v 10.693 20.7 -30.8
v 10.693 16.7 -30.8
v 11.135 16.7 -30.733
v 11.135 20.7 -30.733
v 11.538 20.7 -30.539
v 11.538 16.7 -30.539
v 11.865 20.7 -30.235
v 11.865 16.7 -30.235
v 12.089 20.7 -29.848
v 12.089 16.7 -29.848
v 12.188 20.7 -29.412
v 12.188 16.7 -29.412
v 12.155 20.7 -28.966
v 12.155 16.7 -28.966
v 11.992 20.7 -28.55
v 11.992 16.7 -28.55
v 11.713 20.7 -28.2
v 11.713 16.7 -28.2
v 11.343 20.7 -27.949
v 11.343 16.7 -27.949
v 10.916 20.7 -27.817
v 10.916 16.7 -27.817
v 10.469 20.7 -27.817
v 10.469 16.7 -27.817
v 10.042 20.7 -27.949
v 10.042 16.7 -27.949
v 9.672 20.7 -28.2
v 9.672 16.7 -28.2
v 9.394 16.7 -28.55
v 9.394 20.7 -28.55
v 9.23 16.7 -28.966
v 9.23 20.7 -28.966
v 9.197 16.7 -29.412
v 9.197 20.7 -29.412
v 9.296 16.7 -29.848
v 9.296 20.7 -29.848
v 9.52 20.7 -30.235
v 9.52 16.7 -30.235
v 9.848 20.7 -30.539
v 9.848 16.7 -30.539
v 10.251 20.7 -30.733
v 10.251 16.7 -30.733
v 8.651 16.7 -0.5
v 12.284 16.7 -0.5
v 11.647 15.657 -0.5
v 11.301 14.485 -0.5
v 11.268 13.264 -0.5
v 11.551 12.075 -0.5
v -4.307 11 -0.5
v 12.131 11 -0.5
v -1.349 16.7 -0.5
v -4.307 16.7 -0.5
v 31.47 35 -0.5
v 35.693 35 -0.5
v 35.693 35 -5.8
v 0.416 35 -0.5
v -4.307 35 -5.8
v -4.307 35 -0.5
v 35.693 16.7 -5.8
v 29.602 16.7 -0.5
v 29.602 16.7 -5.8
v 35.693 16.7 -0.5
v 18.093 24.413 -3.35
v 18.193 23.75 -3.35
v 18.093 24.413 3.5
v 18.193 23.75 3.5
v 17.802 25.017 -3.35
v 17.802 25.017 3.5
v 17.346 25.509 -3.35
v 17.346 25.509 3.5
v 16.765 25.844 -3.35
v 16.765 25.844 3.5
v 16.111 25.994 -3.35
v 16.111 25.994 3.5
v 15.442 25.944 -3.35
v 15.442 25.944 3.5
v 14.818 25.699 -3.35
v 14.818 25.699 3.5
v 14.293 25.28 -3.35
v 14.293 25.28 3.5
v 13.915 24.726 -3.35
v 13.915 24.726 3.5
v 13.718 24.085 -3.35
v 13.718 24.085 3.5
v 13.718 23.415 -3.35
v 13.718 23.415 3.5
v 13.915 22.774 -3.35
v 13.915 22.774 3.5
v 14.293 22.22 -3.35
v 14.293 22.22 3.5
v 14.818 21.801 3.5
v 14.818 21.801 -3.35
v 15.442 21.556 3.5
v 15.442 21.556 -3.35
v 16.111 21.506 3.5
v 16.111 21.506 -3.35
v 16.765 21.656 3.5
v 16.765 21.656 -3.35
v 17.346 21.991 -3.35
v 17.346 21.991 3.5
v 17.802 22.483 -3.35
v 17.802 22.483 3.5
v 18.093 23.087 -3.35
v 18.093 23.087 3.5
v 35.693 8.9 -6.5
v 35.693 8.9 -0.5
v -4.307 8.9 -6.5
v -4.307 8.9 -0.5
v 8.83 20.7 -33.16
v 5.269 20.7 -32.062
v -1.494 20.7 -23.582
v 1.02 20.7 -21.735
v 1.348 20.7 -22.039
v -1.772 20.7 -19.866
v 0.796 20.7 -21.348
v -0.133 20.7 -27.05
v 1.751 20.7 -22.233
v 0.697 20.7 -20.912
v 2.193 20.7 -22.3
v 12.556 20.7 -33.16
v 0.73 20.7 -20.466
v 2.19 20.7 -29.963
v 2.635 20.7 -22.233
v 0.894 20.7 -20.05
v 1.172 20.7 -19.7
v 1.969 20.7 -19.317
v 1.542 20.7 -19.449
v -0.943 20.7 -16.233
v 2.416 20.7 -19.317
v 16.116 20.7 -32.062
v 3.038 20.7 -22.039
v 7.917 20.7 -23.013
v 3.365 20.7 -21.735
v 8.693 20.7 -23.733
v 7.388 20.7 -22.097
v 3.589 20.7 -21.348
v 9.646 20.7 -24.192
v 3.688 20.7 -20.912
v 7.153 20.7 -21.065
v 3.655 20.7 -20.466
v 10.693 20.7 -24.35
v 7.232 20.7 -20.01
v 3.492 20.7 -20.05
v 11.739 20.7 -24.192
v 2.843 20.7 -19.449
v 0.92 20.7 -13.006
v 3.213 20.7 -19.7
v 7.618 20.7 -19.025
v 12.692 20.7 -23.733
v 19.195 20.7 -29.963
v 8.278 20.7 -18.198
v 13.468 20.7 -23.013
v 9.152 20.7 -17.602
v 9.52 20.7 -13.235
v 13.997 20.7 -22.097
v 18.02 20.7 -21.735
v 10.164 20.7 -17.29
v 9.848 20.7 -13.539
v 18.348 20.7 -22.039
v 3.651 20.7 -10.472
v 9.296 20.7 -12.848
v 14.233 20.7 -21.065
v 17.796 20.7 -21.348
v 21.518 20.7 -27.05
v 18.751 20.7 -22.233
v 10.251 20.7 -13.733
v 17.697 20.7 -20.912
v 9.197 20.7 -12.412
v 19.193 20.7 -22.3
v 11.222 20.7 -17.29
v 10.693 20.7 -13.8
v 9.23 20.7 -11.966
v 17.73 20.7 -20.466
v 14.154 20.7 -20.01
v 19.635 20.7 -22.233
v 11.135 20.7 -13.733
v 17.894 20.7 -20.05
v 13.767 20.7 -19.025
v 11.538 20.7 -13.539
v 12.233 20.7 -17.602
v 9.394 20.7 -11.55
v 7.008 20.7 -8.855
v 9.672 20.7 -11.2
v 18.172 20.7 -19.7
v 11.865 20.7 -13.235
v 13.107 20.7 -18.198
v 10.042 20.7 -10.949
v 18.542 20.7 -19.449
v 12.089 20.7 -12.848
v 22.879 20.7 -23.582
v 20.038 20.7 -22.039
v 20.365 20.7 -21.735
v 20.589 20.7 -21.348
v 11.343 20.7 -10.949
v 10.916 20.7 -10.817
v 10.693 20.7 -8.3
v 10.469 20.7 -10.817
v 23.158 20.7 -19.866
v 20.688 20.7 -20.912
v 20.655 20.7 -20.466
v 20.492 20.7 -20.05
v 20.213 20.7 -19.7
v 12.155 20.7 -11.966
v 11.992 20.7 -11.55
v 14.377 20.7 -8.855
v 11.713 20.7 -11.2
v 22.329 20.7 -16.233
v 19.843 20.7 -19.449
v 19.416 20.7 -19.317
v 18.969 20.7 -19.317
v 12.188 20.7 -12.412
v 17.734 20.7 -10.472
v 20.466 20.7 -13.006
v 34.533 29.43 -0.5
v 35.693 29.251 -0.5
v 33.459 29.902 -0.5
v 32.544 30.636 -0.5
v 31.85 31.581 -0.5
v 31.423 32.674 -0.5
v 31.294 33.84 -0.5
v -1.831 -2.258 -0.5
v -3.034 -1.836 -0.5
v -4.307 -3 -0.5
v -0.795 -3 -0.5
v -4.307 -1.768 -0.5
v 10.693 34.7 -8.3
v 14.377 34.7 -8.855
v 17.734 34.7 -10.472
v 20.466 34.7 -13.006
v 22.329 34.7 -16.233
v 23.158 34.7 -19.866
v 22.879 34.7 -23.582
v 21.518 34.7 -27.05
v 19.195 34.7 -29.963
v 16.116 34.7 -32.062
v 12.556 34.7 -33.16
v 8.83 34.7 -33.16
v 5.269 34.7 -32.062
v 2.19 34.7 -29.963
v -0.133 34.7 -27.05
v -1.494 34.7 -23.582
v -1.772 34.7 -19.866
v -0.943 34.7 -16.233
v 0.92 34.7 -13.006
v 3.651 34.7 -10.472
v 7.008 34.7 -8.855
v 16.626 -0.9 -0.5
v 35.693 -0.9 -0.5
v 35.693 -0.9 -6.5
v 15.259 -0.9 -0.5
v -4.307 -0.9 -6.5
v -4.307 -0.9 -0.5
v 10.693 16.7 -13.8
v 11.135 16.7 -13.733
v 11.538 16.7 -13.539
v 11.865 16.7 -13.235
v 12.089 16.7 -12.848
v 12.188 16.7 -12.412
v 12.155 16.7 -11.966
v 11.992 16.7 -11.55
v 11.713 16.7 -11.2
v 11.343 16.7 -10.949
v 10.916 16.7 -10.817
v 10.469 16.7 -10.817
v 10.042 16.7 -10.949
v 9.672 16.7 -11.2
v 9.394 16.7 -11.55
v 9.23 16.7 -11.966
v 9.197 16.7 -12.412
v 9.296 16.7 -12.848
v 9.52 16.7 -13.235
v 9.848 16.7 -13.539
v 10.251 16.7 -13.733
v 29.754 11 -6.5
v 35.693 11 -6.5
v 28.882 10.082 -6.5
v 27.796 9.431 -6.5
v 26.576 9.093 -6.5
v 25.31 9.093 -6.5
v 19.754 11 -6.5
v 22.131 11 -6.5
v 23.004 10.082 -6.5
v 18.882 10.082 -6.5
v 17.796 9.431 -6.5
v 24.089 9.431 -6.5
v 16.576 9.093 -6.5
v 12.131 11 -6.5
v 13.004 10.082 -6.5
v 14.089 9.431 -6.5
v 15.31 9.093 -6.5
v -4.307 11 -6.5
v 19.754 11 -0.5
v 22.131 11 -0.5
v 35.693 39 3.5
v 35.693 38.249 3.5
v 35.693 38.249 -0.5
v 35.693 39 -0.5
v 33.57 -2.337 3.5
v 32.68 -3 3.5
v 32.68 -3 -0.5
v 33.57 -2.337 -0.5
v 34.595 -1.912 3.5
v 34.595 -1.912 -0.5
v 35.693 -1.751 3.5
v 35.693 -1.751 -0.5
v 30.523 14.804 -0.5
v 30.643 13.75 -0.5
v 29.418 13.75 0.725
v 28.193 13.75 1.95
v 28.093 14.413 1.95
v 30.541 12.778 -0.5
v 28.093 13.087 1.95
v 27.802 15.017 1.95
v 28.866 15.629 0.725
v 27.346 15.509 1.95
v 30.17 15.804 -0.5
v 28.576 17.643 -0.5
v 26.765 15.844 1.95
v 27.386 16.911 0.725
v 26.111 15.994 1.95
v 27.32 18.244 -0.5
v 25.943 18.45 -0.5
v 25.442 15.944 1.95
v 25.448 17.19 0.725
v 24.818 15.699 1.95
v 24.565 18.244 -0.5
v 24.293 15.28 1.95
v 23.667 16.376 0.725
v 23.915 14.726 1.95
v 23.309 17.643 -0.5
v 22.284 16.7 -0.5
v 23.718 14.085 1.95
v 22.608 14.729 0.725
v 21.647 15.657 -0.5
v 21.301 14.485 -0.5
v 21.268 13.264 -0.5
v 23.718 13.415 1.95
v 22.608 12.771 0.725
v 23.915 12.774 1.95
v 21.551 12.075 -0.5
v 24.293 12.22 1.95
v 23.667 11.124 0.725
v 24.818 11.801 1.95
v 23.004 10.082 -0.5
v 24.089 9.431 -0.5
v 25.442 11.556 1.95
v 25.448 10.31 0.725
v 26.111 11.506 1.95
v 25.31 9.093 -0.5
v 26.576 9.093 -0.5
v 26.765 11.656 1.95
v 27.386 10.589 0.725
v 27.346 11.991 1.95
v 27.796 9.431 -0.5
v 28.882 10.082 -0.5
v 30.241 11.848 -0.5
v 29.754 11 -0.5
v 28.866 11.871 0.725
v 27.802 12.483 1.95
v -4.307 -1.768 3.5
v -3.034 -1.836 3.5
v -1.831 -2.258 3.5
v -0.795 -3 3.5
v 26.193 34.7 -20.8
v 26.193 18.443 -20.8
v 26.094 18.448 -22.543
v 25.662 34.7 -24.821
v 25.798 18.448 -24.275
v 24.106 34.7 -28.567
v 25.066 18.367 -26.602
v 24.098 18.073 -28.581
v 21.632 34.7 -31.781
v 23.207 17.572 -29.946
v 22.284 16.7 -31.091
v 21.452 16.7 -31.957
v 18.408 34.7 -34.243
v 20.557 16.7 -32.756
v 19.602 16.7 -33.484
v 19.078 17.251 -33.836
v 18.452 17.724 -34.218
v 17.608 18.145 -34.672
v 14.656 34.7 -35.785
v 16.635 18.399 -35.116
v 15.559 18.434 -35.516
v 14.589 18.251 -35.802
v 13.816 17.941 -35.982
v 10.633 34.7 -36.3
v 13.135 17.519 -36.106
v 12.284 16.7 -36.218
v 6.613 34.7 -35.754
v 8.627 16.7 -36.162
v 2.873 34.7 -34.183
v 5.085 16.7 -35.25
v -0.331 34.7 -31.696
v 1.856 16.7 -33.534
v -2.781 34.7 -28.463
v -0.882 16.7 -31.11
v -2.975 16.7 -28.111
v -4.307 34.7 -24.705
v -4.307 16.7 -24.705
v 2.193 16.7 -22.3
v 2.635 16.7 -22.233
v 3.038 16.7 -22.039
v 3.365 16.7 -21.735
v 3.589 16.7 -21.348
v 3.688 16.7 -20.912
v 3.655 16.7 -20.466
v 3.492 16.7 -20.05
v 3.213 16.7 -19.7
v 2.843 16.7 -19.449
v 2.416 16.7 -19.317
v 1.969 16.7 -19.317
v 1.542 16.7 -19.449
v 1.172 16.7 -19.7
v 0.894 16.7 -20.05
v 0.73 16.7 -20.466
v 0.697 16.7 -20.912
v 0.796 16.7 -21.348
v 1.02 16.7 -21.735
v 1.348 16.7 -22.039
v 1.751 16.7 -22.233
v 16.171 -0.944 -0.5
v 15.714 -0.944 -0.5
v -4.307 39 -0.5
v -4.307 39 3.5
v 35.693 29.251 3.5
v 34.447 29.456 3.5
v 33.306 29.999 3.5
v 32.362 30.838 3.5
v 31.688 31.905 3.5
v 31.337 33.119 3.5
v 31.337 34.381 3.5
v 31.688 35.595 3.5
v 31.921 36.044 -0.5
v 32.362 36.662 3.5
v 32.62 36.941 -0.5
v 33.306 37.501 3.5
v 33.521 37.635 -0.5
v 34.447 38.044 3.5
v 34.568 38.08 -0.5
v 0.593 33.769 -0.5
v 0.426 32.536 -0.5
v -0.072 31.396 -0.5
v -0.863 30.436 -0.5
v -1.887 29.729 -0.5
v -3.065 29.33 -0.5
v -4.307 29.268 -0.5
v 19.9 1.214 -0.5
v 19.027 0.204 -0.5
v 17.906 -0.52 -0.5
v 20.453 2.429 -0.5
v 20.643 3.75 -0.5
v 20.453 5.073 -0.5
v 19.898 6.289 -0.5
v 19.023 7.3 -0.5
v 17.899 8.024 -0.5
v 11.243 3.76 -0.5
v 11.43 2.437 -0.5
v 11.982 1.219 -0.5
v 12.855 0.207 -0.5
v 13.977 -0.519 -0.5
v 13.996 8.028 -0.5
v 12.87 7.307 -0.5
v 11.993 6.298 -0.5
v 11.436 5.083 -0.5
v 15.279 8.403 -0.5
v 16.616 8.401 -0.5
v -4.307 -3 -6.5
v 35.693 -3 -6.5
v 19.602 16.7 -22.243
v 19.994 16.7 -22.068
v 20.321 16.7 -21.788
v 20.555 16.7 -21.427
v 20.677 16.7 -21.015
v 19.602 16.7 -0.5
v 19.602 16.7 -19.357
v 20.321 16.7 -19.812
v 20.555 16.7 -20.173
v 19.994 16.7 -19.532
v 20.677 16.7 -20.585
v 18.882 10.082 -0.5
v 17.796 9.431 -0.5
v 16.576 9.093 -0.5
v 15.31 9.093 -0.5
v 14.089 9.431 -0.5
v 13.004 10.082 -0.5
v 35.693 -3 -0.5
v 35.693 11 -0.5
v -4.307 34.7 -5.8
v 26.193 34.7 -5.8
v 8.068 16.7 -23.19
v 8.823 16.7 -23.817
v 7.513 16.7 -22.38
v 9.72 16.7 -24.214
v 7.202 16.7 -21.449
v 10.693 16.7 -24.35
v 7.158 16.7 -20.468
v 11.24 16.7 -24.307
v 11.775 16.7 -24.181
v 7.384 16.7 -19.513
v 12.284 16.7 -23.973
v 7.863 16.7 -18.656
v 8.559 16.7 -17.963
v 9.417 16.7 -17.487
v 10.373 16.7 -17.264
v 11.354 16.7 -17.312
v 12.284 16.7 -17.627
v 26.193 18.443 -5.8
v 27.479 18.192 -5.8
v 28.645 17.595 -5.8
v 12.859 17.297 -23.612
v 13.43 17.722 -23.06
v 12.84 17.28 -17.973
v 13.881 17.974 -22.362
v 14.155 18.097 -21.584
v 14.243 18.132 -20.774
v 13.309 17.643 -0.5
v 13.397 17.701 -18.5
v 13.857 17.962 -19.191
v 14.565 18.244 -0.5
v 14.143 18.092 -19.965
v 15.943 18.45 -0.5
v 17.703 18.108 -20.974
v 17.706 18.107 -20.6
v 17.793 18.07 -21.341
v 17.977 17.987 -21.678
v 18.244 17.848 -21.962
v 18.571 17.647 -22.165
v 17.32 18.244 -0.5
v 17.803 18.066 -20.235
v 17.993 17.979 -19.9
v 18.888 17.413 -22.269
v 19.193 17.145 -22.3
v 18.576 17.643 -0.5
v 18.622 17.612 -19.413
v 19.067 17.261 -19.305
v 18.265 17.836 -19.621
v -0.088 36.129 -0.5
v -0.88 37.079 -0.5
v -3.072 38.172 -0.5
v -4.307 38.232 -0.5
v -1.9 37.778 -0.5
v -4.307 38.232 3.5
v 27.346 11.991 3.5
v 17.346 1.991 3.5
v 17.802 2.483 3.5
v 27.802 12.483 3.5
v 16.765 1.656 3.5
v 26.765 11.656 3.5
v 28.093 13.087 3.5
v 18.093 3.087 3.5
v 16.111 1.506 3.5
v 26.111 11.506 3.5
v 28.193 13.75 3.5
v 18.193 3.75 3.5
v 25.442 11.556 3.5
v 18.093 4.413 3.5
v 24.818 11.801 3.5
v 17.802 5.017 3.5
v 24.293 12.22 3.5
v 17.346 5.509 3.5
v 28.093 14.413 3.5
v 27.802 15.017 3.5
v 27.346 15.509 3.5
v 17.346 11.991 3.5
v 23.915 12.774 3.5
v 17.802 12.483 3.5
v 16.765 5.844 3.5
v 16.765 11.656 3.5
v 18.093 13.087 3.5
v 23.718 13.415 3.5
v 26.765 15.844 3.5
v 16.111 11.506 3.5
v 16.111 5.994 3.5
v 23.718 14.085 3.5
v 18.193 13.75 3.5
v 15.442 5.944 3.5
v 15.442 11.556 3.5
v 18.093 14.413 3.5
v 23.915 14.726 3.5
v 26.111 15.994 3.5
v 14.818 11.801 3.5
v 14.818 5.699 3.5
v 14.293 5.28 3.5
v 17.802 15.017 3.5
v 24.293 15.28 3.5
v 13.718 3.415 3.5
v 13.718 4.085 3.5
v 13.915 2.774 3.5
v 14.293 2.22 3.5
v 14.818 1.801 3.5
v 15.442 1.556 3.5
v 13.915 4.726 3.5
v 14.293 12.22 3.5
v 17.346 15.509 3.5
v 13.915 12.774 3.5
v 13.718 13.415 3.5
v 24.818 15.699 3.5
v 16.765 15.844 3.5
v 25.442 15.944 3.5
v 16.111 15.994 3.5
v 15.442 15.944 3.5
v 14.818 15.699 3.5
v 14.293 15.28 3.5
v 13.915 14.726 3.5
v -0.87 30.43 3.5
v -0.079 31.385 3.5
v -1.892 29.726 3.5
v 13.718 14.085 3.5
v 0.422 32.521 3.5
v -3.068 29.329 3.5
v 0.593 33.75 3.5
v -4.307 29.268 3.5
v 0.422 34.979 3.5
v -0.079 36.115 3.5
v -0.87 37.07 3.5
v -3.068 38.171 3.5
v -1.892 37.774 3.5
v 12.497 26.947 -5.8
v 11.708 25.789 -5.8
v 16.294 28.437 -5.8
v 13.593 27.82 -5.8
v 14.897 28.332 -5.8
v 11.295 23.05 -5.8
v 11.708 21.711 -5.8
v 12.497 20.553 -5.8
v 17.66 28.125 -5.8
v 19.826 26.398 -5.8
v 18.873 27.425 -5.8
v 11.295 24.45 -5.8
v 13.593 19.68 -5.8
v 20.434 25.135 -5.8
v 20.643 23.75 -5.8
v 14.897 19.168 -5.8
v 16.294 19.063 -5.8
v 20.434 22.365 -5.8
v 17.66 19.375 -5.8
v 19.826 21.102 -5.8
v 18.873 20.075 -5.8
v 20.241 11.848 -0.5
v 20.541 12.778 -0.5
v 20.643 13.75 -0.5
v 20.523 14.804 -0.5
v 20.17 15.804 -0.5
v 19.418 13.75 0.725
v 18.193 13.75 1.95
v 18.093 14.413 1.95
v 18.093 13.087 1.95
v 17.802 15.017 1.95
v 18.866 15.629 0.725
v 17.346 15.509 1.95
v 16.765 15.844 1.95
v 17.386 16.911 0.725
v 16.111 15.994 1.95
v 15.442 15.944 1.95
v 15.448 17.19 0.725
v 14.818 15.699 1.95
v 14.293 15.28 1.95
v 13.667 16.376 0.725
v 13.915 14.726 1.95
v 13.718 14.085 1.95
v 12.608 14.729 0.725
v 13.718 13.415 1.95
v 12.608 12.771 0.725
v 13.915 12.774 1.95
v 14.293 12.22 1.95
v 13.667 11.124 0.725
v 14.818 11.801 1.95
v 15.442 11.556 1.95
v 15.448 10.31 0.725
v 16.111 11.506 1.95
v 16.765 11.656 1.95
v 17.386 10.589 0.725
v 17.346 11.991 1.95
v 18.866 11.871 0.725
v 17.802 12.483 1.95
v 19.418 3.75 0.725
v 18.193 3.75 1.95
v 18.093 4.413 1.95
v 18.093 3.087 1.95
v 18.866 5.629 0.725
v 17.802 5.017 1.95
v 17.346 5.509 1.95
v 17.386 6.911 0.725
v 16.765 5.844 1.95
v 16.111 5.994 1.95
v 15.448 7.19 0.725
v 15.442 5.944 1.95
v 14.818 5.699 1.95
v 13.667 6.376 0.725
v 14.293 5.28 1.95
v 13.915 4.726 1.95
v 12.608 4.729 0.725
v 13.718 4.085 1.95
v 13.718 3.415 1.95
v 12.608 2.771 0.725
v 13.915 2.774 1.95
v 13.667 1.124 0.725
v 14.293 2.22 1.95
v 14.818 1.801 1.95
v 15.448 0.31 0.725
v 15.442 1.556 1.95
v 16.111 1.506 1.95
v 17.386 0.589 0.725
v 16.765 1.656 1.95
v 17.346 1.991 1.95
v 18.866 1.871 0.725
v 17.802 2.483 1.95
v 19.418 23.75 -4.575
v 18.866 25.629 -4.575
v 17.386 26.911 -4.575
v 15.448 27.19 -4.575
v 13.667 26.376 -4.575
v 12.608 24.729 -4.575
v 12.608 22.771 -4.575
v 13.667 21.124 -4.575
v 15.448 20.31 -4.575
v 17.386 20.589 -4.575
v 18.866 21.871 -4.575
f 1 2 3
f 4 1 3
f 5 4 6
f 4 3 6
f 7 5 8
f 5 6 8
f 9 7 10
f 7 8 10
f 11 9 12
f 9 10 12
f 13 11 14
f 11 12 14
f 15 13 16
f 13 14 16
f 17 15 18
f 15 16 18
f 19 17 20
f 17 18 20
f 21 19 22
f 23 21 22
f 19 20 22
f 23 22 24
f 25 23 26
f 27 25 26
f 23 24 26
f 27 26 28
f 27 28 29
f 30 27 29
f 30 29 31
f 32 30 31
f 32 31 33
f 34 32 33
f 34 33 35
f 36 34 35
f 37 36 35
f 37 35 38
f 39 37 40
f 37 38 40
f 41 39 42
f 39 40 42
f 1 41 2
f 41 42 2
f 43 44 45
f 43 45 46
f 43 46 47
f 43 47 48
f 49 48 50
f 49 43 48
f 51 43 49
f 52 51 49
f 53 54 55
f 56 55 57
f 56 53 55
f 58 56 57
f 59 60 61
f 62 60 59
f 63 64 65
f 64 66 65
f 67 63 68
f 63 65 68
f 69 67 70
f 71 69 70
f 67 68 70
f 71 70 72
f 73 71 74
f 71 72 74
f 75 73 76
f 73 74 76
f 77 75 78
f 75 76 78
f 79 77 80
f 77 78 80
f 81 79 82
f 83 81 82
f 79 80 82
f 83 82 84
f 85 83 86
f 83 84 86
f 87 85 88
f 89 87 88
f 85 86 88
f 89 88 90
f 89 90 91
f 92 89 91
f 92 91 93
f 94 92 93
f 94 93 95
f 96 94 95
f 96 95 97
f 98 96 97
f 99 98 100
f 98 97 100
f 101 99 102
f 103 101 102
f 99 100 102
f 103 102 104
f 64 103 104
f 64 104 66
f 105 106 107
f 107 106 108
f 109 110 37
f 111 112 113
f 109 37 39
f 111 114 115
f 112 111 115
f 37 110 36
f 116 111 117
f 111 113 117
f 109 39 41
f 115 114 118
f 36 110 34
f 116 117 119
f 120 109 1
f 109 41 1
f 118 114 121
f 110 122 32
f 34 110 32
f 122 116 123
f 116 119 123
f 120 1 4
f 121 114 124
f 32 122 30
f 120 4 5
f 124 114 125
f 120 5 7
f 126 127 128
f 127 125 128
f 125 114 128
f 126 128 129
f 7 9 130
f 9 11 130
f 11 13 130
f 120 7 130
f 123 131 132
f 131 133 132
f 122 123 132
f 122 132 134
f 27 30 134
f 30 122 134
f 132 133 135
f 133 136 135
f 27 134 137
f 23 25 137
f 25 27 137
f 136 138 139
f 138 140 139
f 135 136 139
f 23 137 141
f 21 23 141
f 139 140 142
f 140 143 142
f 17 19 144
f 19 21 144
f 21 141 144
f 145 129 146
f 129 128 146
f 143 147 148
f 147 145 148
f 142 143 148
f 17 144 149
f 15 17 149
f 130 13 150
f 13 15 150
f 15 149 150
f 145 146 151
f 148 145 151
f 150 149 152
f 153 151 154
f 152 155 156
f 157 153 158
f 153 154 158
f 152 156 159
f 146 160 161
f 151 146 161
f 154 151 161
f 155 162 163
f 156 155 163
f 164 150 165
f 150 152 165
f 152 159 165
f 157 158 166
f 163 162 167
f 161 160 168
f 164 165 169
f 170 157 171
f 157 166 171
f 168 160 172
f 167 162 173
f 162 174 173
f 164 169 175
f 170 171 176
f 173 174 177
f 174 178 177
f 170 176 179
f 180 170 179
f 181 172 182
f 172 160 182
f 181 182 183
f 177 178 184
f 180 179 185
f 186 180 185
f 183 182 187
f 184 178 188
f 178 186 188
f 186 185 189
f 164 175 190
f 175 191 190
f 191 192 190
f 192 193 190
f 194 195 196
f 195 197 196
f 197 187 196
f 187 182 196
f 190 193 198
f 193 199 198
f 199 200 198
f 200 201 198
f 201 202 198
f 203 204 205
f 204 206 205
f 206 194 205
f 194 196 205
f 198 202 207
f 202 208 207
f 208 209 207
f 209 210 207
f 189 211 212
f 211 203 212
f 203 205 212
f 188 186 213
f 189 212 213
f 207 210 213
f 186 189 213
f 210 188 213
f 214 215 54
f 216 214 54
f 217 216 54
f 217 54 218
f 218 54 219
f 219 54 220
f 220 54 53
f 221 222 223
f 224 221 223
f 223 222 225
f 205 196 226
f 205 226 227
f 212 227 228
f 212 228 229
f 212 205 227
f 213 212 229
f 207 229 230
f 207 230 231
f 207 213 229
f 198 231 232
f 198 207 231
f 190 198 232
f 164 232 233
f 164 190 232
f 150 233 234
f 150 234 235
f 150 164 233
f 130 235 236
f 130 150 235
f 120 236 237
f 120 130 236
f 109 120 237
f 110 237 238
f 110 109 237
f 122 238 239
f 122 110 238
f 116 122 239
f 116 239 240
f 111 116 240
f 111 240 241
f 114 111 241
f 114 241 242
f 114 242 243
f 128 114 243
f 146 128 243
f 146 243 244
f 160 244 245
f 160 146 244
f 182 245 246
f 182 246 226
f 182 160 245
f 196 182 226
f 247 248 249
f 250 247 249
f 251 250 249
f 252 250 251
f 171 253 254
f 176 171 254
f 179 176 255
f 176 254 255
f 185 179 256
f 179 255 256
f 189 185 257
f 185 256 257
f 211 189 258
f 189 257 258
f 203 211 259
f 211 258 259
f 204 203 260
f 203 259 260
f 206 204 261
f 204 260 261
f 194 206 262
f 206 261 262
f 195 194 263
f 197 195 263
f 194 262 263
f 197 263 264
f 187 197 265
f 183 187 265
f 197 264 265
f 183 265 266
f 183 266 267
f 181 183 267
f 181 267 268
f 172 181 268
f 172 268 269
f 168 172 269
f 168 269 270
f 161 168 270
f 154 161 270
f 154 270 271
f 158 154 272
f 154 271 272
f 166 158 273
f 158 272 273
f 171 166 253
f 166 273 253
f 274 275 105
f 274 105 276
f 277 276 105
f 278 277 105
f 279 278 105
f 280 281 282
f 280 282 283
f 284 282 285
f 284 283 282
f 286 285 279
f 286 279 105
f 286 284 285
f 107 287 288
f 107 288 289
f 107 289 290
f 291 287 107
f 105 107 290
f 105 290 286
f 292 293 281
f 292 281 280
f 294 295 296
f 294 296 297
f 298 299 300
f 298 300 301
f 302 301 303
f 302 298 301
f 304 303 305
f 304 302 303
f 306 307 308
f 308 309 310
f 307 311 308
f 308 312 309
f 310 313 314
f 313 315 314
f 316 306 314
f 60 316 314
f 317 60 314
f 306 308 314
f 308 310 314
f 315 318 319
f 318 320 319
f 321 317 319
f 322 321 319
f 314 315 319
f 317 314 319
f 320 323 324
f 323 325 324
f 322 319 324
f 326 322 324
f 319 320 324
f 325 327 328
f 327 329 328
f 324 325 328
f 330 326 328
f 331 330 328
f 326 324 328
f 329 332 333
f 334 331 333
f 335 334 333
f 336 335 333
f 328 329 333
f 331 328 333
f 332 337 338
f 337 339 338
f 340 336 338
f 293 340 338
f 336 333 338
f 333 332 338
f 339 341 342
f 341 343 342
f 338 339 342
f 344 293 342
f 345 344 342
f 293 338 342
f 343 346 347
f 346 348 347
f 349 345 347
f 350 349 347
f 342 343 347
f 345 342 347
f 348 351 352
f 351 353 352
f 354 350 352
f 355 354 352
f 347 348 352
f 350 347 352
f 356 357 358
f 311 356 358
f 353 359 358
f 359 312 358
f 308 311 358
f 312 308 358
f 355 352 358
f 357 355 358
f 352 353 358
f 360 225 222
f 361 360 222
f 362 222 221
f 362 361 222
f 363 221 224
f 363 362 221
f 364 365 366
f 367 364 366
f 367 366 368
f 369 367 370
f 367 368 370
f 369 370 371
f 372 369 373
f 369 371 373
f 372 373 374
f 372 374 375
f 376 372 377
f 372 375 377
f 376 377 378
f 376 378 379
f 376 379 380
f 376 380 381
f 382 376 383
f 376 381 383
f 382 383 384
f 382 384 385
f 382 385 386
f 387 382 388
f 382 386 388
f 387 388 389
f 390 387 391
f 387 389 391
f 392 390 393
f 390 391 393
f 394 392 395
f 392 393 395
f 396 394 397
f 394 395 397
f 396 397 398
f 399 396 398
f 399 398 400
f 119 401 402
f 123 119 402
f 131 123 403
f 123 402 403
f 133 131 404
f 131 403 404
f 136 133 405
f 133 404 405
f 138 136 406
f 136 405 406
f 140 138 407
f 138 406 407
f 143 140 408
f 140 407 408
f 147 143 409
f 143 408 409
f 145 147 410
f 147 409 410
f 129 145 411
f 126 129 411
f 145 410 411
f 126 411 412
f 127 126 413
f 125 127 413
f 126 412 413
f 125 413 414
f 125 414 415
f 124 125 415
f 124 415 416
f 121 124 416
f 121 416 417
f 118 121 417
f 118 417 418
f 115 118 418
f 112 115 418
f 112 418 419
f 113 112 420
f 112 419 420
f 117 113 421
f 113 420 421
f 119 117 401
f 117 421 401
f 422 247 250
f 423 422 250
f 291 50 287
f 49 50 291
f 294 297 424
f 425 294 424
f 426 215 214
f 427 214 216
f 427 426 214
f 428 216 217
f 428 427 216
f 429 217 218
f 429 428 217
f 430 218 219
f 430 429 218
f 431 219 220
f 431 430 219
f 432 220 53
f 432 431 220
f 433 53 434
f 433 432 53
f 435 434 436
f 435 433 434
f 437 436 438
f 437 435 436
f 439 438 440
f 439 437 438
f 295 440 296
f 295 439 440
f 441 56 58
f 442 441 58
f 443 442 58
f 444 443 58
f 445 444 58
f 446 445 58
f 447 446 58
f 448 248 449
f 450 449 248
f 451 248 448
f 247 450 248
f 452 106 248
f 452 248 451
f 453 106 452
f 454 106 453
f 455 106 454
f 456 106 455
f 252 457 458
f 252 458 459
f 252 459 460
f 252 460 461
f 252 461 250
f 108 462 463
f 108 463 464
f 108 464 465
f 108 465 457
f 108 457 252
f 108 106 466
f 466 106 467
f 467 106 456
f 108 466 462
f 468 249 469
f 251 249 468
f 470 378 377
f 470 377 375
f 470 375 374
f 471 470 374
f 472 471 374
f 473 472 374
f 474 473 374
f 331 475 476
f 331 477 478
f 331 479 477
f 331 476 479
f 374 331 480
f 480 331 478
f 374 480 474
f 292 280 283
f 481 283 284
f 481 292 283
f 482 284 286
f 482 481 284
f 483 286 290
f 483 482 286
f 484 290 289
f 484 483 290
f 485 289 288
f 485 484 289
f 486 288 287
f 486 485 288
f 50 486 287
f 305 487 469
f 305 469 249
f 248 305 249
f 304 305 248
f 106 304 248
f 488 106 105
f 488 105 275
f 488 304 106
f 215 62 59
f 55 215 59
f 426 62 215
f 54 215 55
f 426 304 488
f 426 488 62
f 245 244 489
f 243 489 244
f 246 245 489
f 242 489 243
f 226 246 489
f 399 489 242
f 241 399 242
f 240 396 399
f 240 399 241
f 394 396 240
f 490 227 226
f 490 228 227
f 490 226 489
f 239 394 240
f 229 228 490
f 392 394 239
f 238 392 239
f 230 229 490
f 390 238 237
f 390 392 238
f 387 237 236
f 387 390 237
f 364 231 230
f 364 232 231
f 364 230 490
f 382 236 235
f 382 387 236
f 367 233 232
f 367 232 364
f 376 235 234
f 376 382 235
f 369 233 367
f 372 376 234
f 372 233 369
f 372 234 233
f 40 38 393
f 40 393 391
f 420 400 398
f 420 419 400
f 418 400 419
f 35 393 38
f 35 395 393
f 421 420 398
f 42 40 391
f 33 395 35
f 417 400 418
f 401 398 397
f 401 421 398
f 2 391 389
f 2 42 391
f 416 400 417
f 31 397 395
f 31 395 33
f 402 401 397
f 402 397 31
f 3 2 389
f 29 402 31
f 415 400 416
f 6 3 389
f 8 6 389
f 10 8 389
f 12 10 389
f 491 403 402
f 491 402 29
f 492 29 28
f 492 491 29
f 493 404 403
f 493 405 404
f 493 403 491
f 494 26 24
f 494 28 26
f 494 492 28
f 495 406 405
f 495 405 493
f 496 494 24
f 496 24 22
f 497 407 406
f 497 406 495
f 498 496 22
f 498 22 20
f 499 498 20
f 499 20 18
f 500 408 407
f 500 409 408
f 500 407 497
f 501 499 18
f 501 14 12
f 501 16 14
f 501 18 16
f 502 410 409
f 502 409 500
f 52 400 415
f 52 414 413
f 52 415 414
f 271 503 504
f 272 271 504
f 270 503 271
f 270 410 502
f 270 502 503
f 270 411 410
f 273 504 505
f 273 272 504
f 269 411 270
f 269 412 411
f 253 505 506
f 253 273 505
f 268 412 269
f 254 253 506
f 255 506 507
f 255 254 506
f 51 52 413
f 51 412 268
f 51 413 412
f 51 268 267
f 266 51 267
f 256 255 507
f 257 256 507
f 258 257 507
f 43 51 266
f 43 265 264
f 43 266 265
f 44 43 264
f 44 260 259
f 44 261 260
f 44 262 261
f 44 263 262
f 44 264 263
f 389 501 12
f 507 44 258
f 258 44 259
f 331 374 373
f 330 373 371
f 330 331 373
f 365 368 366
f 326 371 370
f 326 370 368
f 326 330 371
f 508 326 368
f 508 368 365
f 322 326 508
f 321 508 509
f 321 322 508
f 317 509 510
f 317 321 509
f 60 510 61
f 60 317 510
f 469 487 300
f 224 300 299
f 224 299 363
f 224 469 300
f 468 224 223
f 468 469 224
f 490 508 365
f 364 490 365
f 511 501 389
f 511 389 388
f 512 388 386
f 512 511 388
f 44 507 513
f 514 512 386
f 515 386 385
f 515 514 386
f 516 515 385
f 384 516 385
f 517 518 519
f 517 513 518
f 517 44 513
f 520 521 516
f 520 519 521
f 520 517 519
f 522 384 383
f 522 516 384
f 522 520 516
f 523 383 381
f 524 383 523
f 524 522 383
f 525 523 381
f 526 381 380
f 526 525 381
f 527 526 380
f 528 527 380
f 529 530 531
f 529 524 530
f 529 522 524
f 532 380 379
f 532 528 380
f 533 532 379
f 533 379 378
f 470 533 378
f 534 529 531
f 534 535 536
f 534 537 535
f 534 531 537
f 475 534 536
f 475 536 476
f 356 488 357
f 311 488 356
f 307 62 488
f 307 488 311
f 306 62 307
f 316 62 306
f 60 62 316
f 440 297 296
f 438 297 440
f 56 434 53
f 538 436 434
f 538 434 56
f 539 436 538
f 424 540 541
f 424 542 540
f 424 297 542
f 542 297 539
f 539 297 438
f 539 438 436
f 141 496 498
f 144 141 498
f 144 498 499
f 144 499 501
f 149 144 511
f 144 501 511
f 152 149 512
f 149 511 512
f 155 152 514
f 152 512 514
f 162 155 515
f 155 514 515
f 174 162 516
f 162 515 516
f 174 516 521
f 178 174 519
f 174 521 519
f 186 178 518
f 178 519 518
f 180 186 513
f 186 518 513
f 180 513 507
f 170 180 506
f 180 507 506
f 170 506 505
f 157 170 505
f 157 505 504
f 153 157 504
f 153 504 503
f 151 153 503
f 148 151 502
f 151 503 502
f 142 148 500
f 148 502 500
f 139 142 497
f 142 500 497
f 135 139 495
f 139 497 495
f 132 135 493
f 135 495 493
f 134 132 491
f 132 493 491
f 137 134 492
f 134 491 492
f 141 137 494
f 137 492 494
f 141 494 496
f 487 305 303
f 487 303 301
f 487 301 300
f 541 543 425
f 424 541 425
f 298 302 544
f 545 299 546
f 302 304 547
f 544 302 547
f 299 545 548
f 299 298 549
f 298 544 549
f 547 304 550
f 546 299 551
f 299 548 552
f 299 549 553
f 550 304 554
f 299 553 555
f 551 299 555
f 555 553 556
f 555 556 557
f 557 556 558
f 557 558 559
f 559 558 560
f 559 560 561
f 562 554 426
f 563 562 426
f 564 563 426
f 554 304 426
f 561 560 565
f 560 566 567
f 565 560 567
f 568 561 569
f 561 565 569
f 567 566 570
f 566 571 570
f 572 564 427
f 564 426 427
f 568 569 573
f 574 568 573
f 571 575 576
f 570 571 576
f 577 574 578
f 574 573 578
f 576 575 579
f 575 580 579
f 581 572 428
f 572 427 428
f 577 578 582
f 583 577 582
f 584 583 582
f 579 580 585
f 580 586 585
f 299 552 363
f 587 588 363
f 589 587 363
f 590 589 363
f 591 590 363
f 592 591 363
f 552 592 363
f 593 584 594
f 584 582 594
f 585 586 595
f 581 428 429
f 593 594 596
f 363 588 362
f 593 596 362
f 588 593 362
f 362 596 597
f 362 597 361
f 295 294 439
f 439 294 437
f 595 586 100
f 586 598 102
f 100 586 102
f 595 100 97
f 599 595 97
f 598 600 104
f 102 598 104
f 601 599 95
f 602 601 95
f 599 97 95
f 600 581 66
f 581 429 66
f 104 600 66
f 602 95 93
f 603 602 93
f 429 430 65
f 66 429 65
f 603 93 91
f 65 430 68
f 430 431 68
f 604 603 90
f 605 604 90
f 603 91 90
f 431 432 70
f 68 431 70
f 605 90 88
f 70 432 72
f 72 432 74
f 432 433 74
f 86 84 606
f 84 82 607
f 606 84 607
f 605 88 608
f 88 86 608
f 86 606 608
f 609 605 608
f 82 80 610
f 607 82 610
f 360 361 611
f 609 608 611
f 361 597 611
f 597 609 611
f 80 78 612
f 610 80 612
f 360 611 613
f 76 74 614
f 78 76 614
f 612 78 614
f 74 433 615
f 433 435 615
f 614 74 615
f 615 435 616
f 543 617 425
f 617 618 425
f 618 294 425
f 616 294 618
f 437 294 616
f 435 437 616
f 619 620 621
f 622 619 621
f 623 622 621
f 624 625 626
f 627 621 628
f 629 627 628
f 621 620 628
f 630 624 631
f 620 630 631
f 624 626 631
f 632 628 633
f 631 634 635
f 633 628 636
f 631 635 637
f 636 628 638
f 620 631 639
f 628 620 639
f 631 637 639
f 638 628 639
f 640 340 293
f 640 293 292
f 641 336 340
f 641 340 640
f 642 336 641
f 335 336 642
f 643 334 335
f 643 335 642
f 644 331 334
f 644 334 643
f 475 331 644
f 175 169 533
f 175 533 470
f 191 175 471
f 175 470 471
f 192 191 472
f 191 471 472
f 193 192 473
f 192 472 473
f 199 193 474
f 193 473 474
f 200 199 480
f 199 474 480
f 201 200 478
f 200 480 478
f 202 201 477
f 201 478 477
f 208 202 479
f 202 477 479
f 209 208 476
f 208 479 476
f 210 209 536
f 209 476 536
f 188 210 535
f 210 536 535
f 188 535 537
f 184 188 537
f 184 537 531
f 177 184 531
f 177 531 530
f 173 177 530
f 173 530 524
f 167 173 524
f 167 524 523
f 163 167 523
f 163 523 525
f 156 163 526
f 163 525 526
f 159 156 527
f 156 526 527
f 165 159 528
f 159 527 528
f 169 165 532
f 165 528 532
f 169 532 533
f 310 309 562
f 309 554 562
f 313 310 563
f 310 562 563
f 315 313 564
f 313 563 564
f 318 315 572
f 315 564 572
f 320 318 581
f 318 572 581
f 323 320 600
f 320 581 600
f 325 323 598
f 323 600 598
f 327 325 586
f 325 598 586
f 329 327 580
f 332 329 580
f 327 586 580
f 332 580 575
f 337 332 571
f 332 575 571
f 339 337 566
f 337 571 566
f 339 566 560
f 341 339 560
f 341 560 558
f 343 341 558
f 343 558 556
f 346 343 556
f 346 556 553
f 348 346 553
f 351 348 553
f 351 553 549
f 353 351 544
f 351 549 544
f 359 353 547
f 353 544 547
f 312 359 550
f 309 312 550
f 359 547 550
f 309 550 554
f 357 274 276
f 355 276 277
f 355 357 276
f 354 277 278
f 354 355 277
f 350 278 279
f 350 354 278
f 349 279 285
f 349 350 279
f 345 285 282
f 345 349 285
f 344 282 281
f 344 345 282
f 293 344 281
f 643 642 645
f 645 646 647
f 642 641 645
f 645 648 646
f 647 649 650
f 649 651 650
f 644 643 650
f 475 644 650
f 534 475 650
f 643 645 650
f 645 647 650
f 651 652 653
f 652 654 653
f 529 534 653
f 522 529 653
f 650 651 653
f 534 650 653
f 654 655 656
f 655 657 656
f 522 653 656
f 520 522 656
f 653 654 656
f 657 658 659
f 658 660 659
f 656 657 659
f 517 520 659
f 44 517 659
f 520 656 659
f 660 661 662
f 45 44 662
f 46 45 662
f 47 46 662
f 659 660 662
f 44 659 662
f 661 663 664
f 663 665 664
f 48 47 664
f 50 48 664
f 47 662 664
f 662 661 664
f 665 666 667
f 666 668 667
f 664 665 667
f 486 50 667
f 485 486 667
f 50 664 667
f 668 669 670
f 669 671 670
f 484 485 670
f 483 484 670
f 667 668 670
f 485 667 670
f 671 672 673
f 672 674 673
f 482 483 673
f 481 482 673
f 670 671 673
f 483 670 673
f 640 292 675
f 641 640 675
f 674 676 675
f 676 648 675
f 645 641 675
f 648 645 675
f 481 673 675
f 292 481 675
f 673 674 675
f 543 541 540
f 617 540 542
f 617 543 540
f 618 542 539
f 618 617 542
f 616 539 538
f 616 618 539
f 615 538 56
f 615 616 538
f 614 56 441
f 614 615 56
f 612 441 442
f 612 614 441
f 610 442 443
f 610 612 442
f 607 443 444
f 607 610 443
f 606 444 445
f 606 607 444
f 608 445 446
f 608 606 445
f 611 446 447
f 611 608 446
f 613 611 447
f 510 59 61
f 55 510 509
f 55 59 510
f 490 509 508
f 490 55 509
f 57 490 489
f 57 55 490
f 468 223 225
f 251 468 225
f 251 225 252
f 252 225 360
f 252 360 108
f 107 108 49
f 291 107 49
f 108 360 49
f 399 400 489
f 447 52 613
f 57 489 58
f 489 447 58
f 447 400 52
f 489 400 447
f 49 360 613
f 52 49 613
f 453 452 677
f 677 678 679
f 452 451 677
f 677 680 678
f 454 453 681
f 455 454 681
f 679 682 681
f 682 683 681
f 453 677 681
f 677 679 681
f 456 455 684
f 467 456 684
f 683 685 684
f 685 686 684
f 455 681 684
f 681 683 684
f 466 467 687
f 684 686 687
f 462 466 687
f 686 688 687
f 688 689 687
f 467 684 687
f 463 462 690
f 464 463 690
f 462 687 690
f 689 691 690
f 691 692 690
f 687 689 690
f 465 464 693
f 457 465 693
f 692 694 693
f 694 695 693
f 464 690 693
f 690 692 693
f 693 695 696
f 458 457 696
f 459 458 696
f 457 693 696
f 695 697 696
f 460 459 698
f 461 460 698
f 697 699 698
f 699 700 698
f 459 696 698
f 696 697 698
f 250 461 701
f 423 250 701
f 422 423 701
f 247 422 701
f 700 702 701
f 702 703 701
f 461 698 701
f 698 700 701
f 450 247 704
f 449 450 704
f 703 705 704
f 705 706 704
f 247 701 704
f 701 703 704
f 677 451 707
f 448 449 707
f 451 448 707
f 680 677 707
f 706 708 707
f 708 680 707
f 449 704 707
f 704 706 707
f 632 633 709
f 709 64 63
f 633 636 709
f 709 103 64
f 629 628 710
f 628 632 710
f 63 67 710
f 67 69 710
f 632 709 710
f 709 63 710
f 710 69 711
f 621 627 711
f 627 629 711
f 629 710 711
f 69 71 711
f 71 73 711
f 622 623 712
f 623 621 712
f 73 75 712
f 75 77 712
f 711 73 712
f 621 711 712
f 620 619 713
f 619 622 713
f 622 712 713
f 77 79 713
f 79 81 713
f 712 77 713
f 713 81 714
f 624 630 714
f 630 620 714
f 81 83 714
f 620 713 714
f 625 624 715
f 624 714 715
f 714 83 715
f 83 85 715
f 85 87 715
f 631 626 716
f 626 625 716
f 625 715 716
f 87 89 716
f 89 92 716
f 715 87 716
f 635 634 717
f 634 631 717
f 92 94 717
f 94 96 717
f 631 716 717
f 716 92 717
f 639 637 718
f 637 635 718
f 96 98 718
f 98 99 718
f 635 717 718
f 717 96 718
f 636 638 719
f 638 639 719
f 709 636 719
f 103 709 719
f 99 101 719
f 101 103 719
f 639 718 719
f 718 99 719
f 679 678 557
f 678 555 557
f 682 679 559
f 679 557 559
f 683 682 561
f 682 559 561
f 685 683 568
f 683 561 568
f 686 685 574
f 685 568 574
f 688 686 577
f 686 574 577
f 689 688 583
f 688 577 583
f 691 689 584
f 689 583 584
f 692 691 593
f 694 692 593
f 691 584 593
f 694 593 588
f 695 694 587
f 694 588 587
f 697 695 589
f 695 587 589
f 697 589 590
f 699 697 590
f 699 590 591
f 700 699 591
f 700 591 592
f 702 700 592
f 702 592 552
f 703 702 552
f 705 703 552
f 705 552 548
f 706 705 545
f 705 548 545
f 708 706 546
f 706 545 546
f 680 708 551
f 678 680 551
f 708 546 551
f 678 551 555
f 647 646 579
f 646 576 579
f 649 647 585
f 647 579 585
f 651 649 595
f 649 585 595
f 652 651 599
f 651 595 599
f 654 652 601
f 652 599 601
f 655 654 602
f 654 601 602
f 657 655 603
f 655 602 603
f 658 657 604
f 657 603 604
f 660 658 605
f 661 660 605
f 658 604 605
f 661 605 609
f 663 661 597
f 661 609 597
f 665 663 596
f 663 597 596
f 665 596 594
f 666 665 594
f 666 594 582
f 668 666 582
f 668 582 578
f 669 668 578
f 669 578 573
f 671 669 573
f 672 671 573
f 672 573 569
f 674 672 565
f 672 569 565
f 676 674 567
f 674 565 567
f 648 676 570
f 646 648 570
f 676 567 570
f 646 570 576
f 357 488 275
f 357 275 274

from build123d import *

# Parameters (mm, degrees)
BOSS_EXTRUDE1_START = 0.5
SKETCH1_W           = 25
SKETCH1_H           = 14
BOSS_EXTRUDE1_DEPTH = 2
SKETCH2_W           = 25
SKETCH2_H           = 2.1
BOSS_EXTRUDE2_DEPTH = 6
SKETCH3_W           = 40
SKETCH3_H           = 42
BOSS_EXTRUDE3_DEPTH = 4
BOSS_EXTRUDE5_START = -18.3
SKETCH4_2_R         = 1.5
BOSS_EXTRUDE5_DEPTH = 4
SKETCH5_W           = 40
SKETCH5_H           = 18.3
BOSS_EXTRUDE6_DEPTH = 5.3
SKETCH7_R           = 4.5
CUT_EXTRUDE1_DEPTH  = 4
SKETCH9_W           = 35.343646405
SKETCH9_H           = 8.813303651
CUT_EXTRUDE3_DEPTH  = 10
SKETCH11_R          = 12.5
SKETCH11_R_2        = 1.5
SKETCH11_R_3        = 3.55
BOSS_EXTRUDE7_DEPTH = 4
SKETCH12_R          = 12.5
BOSS_EXTRUDE8_DEPTH = 14
SKETCH13_W          = 15
SKETCH13_H          = 2.1
BOSS_EXTRUDE9_DEPTH = 6
CUT_EXTRUDE2_DEPTH  = 64.84830294
SKETCH14_W          = 6.01632357
SKETCH14_H          = 22.957747356
CUT_EXTRUDE4_DEPTH  = 64.347816028


# Read off the part's stored shape, not the designer's step: CSK for M4 Flat Head Machine Screw1
with BuildPart() as part:
    # Sketch1 → Boss-Extrude1 (new body)
    with BuildSketch(Plane.XY.offset(-1).offset(BOSS_EXTRUDE1_START)):
        with Locations((23.192657344, 4)):
            Rectangle(SKETCH1_W, SKETCH1_H)
    extrude(amount=BOSS_EXTRUDE1_DEPTH)

    # Sketch2 → Boss-Extrude2 (add)
    with BuildSketch(Plane(origin=(0, 0, -0.5), x_dir=(-1, 0, 0), z_dir=(0, 0, -1))):
        with Locations((-23.192657344, 9.95)):
            Rectangle(SKETCH2_W, SKETCH2_H)
        with Locations((-23.192657344, -1.95)):
            Rectangle(SKETCH2_W, SKETCH2_H)
    extrude(amount=BOSS_EXTRUDE2_DEPTH)

    # Sketch3 → Boss-Extrude3 (add)
    with BuildSketch(Plane(origin=(0, 0, -0.5), x_dir=(-1, 0, 0), z_dir=(0, 0, -1))):
        with Locations((-15.692657344, 18)):
            Rectangle(SKETCH3_W, SKETCH3_H)
    extrude(amount=-BOSS_EXTRUDE3_DEPTH)

    # Sketch4<2> → Boss-Extrude5 (add)
    with BuildSketch(Plane(origin=(0, 35, 0), x_dir=(1, 0, 0), z_dir=(0, 1, 0)).offset(BOSS_EXTRUDE5_START)):
        with BuildLine():
            Line((-1.349302764, 24.5), (-1.349302764, 0.5))
            Line((-1.349302764, 0.5), (8.650697236, 0.5))
            Line((8.650697236, 0.5), (8.650697236, 24.5))
            ThreePointArc((8.650697236, 24.5), (3.650697236, 29.5), (-1.349302764, 24.5))
        make_face()
        with Locations(Location((3.650697236, 7.5, 0), (0, 0, 270))):
            Circle(SKETCH4_2_R, mode=Mode.SUBTRACT)
        with Locations(Location((3.650697236, 24.5, 0), (0, 0, 270))):
            Circle(SKETCH4_2_R, mode=Mode.SUBTRACT)
    extrude(amount=-BOSS_EXTRUDE5_DEPTH)

    # Sketch5 → Boss-Extrude6 (add)
    with BuildSketch(Plane(origin=(0, 0, -0.5), x_dir=(-1, 0, 0), z_dir=(0, 0, -1))):
        with Locations((-15.692657344, 25.85)):
            Rectangle(SKETCH5_W, SKETCH5_H)
    extrude(amount=BOSS_EXTRUDE6_DEPTH)

    # CSK for M4 Flat Head Machine Screw1 outl → CSK for M4 Flat Head Machine Screw1 (revolve, cut)
    with BuildSketch(Plane(origin=(15.942657344, 23.75, 0), x_dir=(1, 0, 0), z_dir=(0, -1, 0))):
        Polygon((2.25, -3.35), (2.25, 3.5), (0, 3.5), (0, -5.8), (4.7, -5.8), align=None)
    revolve(axis=Axis((15.942657344, 23.75, 0), (0, 0, 1)), mode=Mode.SUBTRACT)

    # CSK for M4 Flat Head Machine Screw1 2 ou → CSK for M4 Flat Head Machine Screw1 2 (revolve, cut)
    with BuildSketch(Plane(origin=(15.942657344, 3.75, 0), x_dir=(1, 0, 0), z_dir=(0, -1, 0))):
        Polygon((4.7, -0.5), (2.25, 1.95), (2.25, 3.5), (0, 3.5), (0, -0.5), align=None)
    revolve(axis=Axis((15.942657344, 3.75, 0), (0, 0, 1)), mode=Mode.SUBTRACT)

    # CSK for M4 Flat Head Machine Screw1 3 ou → CSK for M4 Flat Head Machine Screw1 3 (revolve, cut)
    with BuildSketch(Plane(origin=(15.942657344, 13.75, 0), x_dir=(1, 0, 0), z_dir=(0, -1, 0))):
        Polygon((4.7, -0.5), (2.25, 1.95), (2.25, 3.5), (0, 3.5), (0, -0.5), align=None)
    revolve(axis=Axis((15.942657344, 13.75, 0), (0, 0, 1)), mode=Mode.SUBTRACT)

    # CSK for M4 Flat Head Machine Screw1 4 ou → CSK for M4 Flat Head Machine Screw1 4 (revolve, cut)
    with BuildSketch(Plane(origin=(25.942657344, 13.75, 0), x_dir=(1, 0, 0), z_dir=(0, -1, 0))):
        Polygon((2.25, 1.95), (2.25, 3.5), (0, 3.5), (0, -0.5), (4.7, -0.5), align=None)
    revolve(axis=Axis((25.942657344, 13.75, 0), (0, 0, 1)), mode=Mode.SUBTRACT)

    # Sketch7 → Cut-Extrude1 (cut)
    with BuildSketch(Plane(origin=(0, 0, 3.5), x_dir=(-1, 0, 0), z_dir=(0, 0, -1))):
        with Locations((-35.792657344, 33.75)):
            Circle(SKETCH7_R)
        with Locations((3.907342656, 33.75)):
            Circle(SKETCH7_R)
        with Locations((3.907342656, -6.25)):
            Circle(SKETCH7_R)
        with Locations((-35.792657344, -6.25)):
            Circle(SKETCH7_R)
    extrude(amount=CUT_EXTRUDE1_DEPTH, mode=Mode.SUBTRACT)

    # Sketch9 → Cut-Extrude3 (cut)
    with BuildSketch(Plane.ZY.offset(1.349302764)):
        with Locations((-18.171823203, 12.293348175)):
            Rectangle(SKETCH9_W, SKETCH9_H)
    extrude(amount=-CUT_EXTRUDE3_DEPTH, mode=Mode.SUBTRACT)

    # Sketch11 → Boss-Extrude7 (add)
    # profile 1 of 4: a face of its own
    with BuildSketch(Plane.XZ.offset(-16.7)):
        with BuildLine():
            Line((6.787532506, -5.8), (-4.307342656, -5.8))
            Line((-4.307342656, -5.8), (-4.807342656, -5.8))
            Line((-4.807342656, -5.8), (-4.807342656, -20.8))
            ThreePointArc((-4.807342656, -20.8), (-1.570691199, -11.320533638), (6.787532506, -5.8))
        make_face()
    # profile 2 of 4: a face of its own
    with BuildSketch(Plane.XZ.offset(-16.7)):
        with BuildLine():
            Line((14.597782182, -5.8), (6.787532506, -5.8))
            ThreePointArc((6.787532506, -5.8), (-1.570691199, -11.320533638), (-4.807342656, -20.8))
            ThreePointArc((-4.807342656, -20.8), (10.692657344, -36.3), (26.192657344, -20.8))
            ThreePointArc((26.192657344, -20.8), (22.956005887, -11.320533638), (14.597782182, -5.8))
        make_face()
        with Locations((10.692657344, -20.8)):
            Circle(SKETCH11_R, mode=Mode.SUBTRACT)
    # profile 3 of 4: a face of its own
    with BuildSketch(Plane.XZ.offset(-16.7)):
        with Locations((10.692657344, -20.8)):
            Circle(SKETCH11_R)
        with Locations(Location((10.692657344, -12.3, 0), (0, 0, 270))):
            Circle(SKETCH11_R_2, mode=Mode.SUBTRACT)
        with Locations(Location((10.692657344, -20.8, 0), (0, 0, 270))):
            Circle(SKETCH11_R_3, mode=Mode.SUBTRACT)
        with Locations(Location((19.192657344, -20.8, 0), (0, 0, 270))):
            Circle(SKETCH11_R_2, mode=Mode.SUBTRACT)
        with Locations(Location((10.692657344, -29.3, 0), (0, 0, 270))):
            Circle(SKETCH11_R_2, mode=Mode.SUBTRACT)
        with Locations(Location((2.192657344, -20.8, 0), (0, 0, 270))):
            Circle(SKETCH11_R_2, mode=Mode.SUBTRACT)
    # profile 4 of 4: a face of its own
    with BuildSketch(Plane.XZ.offset(-16.7)):
        with BuildLine():
            Line((26.192657344, -5.8), (14.597782182, -5.8))
            ThreePointArc((14.597782182, -5.8), (22.956005887, -11.320533638), (26.192657344, -20.8))
            Line((26.192657344, -20.8), (26.192657344, -5.8))
        make_face()
    extrude(amount=-BOSS_EXTRUDE7_DEPTH)

    # Sketch12 → Boss-Extrude8 (add)
    # profile 1 of 3: a face of its own
    with BuildSketch(Plane(origin=(0, 20.7, 0), x_dir=(1, 0, 0), z_dir=(0, 1, 0))):
        with BuildLine():
            ThreePointArc((26.192657344, 20.8), (10.692657344, 36.3), (-4.807342656, 20.8))
            ThreePointArc((-4.807342656, 20.8), (-1.570691199, 11.320533638), (6.787532506, 5.8))
            Line((6.787532506, 5.8), (12.366695935, 5.8))
            Line((12.366695935, 5.8), (14.597782182, 5.8))
            ThreePointArc((14.597782182, 5.8), (22.956005887, 11.320533638), (26.192657344, 20.8))
        make_face()
        with Locations(Location((10.692657344, 20.8, 0), (0, 0, 270))):
            Circle(SKETCH12_R, mode=Mode.SUBTRACT)
    # profile 2 of 3: a face of its own
    with BuildSketch(Plane(origin=(0, 20.7, 0), x_dir=(1, 0, 0), z_dir=(0, 1, 0))):
        with BuildLine():
            Line((-4.807342656, 20.8), (-4.807342656, 5.8))
            Line((-4.807342656, 5.8), (-4.307342656, 5.8))
            Line((-4.307342656, 5.8), (6.787532506, 5.8))
            ThreePointArc((6.787532506, 5.8), (-1.570691199, 11.320533638), (-4.807342656, 20.8))
        make_face()
    # profile 3 of 3: a face of its own
    with BuildSketch(Plane(origin=(0, 20.7, 0), x_dir=(1, 0, 0), z_dir=(0, 1, 0))):
        with BuildLine():
            Line((26.192657344, 5.8), (26.192657344, 20.8))
            ThreePointArc((26.192657344, 20.8), (22.956005887, 11.320533638), (14.597782182, 5.8))
            Line((14.597782182, 5.8), (19.518618753, 5.8))
            Line((19.518618753, 5.8), (26.192657344, 5.8))
        make_face()
    extrude(amount=BOSS_EXTRUDE8_DEPTH)

    # Sketch13 → Boss-Extrude9 (add)
    with BuildSketch(Plane(origin=(0, 0, -0.5), x_dir=(-1, 0, 0), z_dir=(0, 0, -1))):
        with Locations((-3.192657344, 9.95)):
            Rectangle(SKETCH13_W, SKETCH13_H)
        with Locations((-3.192657344, -1.95)):
            Rectangle(SKETCH13_W, SKETCH13_H)
    extrude(amount=BOSS_EXTRUDE9_DEPTH)

    # Sketch8 → Cut-Extrude2 (cut, through all)
    with BuildSketch(Plane(origin=(0, 0, -0.5), x_dir=(-1, 0, 0), z_dir=(0, 0, -1))):
        with BuildLine():
            ThreePointArc((-12.283764069, 16.7), (-15.942657344, 18.45), (-19.601550619, 16.7))
            ThreePointArc((-19.601550619, 16.7), (-20.640973864, 13.875785056), (-19.754153113, 11))
            ThreePointArc((-19.754153113, 11), (-15.942657344, 9.05), (-12.131161575, 11))
            ThreePointArc((-12.131161575, 11), (-11.244340824, 13.875785056), (-12.283764069, 16.7))
        make_face()
        with BuildLine():
            ThreePointArc((-22.283764069, 16.7), (-25.942657344, 18.45), (-29.601550619, 16.7))
            ThreePointArc((-29.601550619, 16.7), (-30.640973864, 13.875785056), (-29.754153113, 11))
            ThreePointArc((-29.754153113, 11), (-25.942657344, 9.05), (-22.131161575, 11))
            ThreePointArc((-22.131161575, 11), (-21.244340824, 13.875785056), (-22.283764069, 16.7))
        make_face()
    extrude(amount=CUT_EXTRUDE2_DEPTH, mode=Mode.SUBTRACT)

    # Sketch14 → Cut-Extrude4 (cut, through all)
    with BuildSketch(Plane(origin=(0, 34.7, 0), x_dir=(1, 0, 0), z_dir=(0, 1, 0))):
        with Locations((-7.315504441, 17.278873678)):
            Rectangle(SKETCH14_W, SKETCH14_H)
    extrude(amount=-CUT_EXTRUDE4_DEPTH, mode=Mode.SUBTRACT)


solid = part.part
